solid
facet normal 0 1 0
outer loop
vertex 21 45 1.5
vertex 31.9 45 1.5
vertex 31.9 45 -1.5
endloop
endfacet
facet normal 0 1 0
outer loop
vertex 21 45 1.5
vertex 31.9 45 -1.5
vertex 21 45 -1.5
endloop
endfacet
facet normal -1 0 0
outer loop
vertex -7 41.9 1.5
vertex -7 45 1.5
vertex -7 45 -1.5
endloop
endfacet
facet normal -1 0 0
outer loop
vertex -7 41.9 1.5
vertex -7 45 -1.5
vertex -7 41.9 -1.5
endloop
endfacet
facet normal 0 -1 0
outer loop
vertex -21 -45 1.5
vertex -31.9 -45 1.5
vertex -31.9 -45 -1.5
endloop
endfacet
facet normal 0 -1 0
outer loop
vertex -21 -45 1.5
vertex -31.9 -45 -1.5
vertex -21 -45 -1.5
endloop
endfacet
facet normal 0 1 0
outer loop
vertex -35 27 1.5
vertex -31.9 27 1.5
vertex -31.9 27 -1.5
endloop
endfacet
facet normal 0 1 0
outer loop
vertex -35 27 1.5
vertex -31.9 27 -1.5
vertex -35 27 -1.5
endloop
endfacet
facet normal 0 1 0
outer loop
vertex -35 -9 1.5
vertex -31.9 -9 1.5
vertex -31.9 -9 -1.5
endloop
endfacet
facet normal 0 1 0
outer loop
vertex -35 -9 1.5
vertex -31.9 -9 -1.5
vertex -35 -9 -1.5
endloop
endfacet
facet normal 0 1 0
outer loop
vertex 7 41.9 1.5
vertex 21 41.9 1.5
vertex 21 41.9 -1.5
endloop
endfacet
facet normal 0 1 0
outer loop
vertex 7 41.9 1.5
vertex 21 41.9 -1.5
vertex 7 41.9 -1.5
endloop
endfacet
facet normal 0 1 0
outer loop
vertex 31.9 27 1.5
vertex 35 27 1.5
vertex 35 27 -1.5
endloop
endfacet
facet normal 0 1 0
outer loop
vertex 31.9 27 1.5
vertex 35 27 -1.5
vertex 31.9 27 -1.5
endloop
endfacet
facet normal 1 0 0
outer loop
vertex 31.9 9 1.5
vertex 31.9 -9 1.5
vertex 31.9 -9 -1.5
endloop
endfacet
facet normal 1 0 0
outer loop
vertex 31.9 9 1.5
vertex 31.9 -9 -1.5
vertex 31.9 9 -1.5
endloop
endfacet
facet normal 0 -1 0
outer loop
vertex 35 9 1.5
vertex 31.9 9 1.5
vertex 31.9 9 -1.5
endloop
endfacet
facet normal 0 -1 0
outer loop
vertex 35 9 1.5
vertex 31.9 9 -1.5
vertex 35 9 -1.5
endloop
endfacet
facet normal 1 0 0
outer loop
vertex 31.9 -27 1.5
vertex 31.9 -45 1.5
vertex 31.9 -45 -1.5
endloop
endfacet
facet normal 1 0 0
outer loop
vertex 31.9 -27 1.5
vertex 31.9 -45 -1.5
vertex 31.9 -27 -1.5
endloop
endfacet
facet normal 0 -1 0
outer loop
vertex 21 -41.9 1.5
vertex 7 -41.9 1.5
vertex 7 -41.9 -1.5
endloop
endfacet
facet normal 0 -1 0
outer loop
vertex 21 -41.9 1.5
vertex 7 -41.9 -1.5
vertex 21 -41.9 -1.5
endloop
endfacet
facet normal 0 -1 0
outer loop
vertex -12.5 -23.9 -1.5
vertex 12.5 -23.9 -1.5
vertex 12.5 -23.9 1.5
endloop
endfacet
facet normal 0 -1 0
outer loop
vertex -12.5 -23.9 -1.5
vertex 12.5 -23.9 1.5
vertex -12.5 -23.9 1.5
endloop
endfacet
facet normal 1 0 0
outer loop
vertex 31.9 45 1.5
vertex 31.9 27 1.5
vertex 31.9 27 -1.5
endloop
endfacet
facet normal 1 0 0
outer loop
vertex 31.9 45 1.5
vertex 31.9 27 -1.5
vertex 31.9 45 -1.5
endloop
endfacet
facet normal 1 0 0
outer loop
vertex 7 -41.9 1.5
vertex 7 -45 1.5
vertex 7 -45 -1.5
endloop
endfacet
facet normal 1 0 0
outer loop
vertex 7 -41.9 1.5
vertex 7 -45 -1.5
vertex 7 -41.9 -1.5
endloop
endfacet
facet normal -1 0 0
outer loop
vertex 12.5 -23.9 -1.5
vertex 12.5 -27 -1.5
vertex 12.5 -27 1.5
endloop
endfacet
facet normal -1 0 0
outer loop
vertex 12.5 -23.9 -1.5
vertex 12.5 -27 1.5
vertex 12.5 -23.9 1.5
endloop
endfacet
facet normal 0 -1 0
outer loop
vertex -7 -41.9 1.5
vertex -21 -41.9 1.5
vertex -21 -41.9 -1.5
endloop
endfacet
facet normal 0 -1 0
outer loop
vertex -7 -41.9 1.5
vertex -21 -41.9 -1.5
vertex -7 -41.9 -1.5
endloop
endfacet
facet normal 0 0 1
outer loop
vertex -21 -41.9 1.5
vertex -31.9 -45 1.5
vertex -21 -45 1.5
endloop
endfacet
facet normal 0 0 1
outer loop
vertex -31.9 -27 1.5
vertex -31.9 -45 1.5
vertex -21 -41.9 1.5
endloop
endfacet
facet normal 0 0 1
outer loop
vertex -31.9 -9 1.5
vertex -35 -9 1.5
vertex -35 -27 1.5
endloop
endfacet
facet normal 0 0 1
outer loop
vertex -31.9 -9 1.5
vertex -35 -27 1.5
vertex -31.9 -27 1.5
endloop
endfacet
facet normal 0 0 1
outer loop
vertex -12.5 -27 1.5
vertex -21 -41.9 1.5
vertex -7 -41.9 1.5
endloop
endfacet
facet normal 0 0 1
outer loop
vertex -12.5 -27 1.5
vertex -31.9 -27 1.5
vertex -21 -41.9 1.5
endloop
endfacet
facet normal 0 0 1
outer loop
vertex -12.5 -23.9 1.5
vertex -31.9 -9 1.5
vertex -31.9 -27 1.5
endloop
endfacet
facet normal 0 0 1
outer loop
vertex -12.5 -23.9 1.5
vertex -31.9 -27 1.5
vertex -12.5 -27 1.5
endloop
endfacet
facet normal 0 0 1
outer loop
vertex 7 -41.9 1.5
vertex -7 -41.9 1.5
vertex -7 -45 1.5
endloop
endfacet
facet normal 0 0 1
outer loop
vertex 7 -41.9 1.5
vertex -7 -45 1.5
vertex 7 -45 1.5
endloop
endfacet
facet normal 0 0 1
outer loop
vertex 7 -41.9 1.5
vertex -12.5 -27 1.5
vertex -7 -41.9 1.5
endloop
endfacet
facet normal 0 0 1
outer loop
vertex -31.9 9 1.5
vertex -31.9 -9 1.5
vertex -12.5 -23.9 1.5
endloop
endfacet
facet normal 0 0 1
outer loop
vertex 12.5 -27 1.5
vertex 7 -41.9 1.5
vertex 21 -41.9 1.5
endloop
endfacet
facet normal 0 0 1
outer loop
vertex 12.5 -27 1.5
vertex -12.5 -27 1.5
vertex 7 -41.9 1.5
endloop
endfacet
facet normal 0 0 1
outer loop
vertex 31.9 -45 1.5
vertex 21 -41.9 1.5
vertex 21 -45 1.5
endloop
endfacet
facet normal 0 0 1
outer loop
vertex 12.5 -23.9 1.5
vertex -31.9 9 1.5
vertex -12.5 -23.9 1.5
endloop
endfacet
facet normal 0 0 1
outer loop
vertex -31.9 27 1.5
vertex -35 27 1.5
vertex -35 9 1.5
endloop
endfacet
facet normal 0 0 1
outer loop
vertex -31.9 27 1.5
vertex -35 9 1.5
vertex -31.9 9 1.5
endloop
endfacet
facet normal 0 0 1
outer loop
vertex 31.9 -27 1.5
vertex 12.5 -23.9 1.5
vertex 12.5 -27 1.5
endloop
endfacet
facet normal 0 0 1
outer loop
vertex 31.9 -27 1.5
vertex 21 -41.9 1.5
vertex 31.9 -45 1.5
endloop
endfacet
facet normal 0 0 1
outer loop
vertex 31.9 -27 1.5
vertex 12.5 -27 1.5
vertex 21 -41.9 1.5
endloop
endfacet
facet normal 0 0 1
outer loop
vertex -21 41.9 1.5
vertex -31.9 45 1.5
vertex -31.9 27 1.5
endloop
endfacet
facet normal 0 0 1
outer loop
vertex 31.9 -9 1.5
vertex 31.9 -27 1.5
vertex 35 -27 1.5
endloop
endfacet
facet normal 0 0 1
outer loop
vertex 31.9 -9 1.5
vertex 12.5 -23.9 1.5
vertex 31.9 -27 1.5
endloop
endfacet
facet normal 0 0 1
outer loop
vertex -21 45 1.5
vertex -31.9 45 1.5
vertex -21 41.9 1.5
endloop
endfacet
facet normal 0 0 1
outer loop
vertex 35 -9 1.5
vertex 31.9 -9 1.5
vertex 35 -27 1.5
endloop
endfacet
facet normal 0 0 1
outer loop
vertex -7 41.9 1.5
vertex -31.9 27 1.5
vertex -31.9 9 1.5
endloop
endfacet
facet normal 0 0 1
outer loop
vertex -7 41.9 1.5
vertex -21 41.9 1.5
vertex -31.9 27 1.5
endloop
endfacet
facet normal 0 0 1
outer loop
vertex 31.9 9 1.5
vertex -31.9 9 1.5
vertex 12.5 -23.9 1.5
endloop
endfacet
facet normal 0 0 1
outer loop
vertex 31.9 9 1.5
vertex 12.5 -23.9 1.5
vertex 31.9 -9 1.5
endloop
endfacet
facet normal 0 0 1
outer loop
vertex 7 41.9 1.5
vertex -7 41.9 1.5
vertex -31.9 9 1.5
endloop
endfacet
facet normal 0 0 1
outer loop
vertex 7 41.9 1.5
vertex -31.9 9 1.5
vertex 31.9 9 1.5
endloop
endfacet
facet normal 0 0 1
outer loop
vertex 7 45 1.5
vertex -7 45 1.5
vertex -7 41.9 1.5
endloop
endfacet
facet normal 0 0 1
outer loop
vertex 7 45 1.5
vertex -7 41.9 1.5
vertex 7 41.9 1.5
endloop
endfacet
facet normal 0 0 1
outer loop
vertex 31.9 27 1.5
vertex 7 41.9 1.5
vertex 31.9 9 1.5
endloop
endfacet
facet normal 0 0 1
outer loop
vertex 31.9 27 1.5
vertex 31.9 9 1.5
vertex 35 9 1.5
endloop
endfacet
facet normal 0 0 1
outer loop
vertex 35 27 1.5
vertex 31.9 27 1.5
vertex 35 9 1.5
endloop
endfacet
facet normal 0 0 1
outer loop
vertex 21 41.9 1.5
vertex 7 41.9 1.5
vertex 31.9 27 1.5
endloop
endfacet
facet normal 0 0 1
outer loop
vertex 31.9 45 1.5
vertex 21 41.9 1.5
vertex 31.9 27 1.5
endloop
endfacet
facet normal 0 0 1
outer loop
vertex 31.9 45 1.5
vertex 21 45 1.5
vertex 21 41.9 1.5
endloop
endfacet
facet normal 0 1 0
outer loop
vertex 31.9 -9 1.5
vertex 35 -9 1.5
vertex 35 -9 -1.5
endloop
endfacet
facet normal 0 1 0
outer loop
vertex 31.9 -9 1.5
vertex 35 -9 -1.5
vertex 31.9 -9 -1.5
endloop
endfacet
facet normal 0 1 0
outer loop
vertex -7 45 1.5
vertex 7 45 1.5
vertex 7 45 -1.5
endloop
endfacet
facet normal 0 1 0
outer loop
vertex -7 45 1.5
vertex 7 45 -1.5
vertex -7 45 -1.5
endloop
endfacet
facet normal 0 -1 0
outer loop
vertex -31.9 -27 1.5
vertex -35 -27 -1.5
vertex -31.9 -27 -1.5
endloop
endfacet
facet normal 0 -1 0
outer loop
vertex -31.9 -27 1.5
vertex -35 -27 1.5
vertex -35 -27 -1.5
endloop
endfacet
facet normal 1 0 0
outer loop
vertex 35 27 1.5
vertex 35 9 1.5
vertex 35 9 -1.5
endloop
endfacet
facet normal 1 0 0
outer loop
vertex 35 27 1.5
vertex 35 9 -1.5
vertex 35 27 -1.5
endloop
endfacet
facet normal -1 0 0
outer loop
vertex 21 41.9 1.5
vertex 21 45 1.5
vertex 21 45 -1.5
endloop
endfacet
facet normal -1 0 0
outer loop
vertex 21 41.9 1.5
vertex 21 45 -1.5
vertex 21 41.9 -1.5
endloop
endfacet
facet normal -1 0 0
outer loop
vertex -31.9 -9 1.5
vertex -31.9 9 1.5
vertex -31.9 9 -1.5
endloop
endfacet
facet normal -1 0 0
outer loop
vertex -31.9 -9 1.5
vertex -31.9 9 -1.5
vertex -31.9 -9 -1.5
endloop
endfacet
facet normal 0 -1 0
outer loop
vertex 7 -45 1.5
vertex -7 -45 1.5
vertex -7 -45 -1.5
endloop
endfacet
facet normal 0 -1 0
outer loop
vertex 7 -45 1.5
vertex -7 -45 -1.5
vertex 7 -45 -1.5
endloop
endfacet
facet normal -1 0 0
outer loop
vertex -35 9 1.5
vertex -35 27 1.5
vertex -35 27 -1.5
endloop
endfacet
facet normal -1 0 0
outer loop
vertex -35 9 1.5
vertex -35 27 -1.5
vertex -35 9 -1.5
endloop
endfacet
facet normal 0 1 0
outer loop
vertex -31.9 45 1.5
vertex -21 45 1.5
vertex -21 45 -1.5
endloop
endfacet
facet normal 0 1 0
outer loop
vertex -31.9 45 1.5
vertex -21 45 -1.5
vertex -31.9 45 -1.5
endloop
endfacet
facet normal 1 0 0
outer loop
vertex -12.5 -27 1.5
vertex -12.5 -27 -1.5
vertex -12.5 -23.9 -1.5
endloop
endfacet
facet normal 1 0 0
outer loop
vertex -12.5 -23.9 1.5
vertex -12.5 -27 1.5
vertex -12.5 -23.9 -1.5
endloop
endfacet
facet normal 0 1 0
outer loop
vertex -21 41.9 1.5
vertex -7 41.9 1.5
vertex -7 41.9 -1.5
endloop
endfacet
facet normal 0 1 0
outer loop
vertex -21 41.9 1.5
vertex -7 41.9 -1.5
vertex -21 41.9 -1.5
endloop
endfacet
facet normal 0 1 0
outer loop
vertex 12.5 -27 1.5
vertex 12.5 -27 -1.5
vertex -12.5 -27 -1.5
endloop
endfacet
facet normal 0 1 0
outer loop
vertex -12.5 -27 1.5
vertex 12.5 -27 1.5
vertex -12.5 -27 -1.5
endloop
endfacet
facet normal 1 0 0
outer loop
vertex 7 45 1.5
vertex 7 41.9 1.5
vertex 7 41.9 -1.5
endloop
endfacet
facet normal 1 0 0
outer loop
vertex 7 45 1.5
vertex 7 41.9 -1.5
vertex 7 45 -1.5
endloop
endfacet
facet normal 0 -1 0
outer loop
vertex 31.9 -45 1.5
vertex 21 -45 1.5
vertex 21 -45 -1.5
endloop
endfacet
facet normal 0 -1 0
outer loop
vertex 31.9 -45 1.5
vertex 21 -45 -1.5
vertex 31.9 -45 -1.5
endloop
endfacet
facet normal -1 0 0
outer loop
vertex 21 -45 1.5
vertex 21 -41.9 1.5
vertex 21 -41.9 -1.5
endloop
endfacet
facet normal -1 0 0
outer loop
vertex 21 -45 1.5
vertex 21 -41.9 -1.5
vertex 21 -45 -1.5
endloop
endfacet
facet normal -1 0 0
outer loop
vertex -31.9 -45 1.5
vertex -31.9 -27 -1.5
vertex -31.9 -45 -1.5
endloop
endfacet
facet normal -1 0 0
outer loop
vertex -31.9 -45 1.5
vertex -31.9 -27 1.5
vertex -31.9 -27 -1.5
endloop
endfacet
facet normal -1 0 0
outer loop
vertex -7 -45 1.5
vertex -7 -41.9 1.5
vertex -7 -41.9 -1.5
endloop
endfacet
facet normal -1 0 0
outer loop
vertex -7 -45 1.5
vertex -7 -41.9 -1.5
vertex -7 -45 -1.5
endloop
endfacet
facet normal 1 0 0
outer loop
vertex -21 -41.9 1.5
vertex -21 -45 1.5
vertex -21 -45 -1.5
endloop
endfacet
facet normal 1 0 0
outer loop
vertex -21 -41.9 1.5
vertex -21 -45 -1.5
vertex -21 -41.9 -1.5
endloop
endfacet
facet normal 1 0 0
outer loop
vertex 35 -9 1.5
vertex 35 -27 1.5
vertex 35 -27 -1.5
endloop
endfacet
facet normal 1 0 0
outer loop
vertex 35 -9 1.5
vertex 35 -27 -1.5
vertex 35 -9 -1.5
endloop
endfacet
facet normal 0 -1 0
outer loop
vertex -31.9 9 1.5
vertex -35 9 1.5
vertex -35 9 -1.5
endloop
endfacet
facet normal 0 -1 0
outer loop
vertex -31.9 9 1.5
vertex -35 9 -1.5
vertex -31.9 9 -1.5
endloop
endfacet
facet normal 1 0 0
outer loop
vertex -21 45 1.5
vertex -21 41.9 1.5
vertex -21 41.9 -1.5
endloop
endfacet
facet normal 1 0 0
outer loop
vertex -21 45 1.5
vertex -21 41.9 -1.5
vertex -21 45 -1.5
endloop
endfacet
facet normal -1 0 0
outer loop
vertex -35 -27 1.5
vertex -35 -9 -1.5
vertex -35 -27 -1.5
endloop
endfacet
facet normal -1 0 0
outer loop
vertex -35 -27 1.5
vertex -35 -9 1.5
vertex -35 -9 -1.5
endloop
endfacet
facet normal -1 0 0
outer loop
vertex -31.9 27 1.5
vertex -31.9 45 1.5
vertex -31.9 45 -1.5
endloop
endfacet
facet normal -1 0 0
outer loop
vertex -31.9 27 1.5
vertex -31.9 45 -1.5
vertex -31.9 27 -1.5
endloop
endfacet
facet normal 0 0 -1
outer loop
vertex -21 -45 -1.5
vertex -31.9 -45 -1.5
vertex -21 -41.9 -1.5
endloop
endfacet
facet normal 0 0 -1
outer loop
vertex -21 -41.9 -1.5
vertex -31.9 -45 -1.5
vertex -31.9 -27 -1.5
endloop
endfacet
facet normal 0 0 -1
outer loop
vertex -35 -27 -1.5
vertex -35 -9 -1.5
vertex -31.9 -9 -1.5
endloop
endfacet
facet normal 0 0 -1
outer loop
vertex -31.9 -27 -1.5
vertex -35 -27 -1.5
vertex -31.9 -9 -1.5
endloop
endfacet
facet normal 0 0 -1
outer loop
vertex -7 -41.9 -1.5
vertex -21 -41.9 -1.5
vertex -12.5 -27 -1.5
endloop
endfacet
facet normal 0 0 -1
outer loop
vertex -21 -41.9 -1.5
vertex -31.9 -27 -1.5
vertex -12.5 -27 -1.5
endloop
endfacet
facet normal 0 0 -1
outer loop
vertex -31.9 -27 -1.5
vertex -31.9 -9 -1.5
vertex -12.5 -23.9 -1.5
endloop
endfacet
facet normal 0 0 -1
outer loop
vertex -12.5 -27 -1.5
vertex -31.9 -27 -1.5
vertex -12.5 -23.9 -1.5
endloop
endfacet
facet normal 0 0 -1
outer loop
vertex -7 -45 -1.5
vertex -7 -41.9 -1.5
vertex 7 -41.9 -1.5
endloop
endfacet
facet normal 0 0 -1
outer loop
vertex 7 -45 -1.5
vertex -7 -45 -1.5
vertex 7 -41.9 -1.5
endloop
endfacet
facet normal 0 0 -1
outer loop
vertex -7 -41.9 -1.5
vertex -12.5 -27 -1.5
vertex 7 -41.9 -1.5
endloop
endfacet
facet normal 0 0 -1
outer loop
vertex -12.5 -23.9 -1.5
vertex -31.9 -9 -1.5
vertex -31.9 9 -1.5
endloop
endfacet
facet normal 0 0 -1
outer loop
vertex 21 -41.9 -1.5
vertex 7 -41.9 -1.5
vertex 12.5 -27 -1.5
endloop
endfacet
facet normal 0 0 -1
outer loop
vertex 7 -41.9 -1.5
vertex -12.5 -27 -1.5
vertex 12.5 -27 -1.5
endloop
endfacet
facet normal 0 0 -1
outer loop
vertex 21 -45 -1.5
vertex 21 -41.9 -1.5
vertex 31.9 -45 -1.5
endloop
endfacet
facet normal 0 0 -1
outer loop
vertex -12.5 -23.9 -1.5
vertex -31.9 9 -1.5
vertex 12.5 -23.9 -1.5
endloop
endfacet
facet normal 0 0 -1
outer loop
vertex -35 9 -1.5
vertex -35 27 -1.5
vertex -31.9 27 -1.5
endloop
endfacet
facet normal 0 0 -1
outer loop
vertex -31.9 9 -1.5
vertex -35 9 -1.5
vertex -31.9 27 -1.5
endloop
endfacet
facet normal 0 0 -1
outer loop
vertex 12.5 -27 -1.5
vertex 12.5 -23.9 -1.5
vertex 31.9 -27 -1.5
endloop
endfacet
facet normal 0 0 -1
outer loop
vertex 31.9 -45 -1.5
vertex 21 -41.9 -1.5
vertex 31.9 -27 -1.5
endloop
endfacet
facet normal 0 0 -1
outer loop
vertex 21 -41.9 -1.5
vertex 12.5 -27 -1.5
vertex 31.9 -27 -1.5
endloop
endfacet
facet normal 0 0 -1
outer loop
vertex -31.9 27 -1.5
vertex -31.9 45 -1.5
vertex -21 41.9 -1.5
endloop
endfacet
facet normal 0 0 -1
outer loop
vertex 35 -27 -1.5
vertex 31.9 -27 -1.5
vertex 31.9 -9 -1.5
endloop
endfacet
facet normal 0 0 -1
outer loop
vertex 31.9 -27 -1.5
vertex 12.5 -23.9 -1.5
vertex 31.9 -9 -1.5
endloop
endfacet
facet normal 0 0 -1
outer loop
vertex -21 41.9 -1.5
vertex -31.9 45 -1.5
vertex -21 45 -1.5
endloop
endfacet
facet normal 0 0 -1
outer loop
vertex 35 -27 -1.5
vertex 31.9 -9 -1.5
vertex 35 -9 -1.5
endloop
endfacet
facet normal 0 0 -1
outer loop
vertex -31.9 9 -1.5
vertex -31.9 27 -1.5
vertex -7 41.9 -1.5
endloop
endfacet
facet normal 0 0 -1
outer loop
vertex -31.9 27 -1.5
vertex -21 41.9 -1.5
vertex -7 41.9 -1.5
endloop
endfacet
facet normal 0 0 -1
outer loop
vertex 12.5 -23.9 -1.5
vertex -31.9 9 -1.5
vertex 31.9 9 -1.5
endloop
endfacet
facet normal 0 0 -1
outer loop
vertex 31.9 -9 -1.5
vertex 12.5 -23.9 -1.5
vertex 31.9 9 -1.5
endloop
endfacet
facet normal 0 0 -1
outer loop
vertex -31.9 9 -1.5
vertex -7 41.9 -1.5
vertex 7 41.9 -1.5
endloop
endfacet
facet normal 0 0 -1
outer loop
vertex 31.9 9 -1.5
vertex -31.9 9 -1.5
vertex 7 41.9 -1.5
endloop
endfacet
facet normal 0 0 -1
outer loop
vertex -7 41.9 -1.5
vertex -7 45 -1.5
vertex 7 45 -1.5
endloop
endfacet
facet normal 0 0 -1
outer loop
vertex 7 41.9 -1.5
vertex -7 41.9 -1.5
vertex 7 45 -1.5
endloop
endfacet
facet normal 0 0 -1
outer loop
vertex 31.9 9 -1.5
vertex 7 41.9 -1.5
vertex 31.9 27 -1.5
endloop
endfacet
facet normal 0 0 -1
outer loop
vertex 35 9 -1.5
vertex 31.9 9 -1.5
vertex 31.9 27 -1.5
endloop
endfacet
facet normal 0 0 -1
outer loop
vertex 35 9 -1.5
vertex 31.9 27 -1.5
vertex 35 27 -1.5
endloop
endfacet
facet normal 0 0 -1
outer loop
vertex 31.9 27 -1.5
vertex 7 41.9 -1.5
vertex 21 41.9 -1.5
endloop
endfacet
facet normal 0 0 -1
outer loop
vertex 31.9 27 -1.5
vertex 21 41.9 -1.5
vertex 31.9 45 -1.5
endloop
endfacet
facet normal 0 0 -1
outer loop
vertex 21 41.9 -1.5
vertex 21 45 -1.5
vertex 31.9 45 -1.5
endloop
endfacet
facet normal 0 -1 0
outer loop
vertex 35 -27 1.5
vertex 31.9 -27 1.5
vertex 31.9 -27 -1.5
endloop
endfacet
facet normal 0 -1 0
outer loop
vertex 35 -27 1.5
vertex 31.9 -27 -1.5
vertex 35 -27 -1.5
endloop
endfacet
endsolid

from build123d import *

# Parameters (mm, degrees)
SALIENTE_EXTRUIR1_DEPTH = 1.5
CROQUIS2_W              = 25
CROQUIS2_H              = 3.1
CORTAR_EXTRUIR1_DEPTH   = 10


with BuildPart() as part:
    # Croquis1 → Saliente-Extruir1 (new, symmetric)
    with BuildSketch(Plane.XY):
        Polygon((-31.9, -27), (-31.9, -45), (-21, -45), (-21, -41.9), (-7, -41.9), (-7, -45), (7, -45), (7, -41.9), (21, -41.9), (21, -45), (31.9, -45), (31.9, -27), (35, -27), (35, -9), (31.9, -9), (31.9, 9), (35, 9), (35, 27), (31.9, 27), (31.9, 45), (21, 45), (21, 41.9), (7, 41.9), (7, 45), (-7, 45), (-7, 41.9), (-21, 41.9), (-21, 45), (-31.9, 45), (-31.9, 27), (-35, 27), (-35, 9), (-31.9, 9), (-31.9, -9), (-35, -9), (-35, -27), align=None)
    extrude(amount=SALIENTE_EXTRUIR1_DEPTH, both=True)

    # Croquis2 → Cortar-Extruir1 (cut)
    with BuildSketch(Plane(origin=(0, 0, -1.5), x_dir=(-1, 0, 0), z_dir=(0, 0, -1))):
        with Locations((0, -25.45)):
            Rectangle(CROQUIS2_W, CROQUIS2_H)
    extrude(amount=-CORTAR_EXTRUIR1_DEPTH, mode=Mode.SUBTRACT)


solid = part.part
